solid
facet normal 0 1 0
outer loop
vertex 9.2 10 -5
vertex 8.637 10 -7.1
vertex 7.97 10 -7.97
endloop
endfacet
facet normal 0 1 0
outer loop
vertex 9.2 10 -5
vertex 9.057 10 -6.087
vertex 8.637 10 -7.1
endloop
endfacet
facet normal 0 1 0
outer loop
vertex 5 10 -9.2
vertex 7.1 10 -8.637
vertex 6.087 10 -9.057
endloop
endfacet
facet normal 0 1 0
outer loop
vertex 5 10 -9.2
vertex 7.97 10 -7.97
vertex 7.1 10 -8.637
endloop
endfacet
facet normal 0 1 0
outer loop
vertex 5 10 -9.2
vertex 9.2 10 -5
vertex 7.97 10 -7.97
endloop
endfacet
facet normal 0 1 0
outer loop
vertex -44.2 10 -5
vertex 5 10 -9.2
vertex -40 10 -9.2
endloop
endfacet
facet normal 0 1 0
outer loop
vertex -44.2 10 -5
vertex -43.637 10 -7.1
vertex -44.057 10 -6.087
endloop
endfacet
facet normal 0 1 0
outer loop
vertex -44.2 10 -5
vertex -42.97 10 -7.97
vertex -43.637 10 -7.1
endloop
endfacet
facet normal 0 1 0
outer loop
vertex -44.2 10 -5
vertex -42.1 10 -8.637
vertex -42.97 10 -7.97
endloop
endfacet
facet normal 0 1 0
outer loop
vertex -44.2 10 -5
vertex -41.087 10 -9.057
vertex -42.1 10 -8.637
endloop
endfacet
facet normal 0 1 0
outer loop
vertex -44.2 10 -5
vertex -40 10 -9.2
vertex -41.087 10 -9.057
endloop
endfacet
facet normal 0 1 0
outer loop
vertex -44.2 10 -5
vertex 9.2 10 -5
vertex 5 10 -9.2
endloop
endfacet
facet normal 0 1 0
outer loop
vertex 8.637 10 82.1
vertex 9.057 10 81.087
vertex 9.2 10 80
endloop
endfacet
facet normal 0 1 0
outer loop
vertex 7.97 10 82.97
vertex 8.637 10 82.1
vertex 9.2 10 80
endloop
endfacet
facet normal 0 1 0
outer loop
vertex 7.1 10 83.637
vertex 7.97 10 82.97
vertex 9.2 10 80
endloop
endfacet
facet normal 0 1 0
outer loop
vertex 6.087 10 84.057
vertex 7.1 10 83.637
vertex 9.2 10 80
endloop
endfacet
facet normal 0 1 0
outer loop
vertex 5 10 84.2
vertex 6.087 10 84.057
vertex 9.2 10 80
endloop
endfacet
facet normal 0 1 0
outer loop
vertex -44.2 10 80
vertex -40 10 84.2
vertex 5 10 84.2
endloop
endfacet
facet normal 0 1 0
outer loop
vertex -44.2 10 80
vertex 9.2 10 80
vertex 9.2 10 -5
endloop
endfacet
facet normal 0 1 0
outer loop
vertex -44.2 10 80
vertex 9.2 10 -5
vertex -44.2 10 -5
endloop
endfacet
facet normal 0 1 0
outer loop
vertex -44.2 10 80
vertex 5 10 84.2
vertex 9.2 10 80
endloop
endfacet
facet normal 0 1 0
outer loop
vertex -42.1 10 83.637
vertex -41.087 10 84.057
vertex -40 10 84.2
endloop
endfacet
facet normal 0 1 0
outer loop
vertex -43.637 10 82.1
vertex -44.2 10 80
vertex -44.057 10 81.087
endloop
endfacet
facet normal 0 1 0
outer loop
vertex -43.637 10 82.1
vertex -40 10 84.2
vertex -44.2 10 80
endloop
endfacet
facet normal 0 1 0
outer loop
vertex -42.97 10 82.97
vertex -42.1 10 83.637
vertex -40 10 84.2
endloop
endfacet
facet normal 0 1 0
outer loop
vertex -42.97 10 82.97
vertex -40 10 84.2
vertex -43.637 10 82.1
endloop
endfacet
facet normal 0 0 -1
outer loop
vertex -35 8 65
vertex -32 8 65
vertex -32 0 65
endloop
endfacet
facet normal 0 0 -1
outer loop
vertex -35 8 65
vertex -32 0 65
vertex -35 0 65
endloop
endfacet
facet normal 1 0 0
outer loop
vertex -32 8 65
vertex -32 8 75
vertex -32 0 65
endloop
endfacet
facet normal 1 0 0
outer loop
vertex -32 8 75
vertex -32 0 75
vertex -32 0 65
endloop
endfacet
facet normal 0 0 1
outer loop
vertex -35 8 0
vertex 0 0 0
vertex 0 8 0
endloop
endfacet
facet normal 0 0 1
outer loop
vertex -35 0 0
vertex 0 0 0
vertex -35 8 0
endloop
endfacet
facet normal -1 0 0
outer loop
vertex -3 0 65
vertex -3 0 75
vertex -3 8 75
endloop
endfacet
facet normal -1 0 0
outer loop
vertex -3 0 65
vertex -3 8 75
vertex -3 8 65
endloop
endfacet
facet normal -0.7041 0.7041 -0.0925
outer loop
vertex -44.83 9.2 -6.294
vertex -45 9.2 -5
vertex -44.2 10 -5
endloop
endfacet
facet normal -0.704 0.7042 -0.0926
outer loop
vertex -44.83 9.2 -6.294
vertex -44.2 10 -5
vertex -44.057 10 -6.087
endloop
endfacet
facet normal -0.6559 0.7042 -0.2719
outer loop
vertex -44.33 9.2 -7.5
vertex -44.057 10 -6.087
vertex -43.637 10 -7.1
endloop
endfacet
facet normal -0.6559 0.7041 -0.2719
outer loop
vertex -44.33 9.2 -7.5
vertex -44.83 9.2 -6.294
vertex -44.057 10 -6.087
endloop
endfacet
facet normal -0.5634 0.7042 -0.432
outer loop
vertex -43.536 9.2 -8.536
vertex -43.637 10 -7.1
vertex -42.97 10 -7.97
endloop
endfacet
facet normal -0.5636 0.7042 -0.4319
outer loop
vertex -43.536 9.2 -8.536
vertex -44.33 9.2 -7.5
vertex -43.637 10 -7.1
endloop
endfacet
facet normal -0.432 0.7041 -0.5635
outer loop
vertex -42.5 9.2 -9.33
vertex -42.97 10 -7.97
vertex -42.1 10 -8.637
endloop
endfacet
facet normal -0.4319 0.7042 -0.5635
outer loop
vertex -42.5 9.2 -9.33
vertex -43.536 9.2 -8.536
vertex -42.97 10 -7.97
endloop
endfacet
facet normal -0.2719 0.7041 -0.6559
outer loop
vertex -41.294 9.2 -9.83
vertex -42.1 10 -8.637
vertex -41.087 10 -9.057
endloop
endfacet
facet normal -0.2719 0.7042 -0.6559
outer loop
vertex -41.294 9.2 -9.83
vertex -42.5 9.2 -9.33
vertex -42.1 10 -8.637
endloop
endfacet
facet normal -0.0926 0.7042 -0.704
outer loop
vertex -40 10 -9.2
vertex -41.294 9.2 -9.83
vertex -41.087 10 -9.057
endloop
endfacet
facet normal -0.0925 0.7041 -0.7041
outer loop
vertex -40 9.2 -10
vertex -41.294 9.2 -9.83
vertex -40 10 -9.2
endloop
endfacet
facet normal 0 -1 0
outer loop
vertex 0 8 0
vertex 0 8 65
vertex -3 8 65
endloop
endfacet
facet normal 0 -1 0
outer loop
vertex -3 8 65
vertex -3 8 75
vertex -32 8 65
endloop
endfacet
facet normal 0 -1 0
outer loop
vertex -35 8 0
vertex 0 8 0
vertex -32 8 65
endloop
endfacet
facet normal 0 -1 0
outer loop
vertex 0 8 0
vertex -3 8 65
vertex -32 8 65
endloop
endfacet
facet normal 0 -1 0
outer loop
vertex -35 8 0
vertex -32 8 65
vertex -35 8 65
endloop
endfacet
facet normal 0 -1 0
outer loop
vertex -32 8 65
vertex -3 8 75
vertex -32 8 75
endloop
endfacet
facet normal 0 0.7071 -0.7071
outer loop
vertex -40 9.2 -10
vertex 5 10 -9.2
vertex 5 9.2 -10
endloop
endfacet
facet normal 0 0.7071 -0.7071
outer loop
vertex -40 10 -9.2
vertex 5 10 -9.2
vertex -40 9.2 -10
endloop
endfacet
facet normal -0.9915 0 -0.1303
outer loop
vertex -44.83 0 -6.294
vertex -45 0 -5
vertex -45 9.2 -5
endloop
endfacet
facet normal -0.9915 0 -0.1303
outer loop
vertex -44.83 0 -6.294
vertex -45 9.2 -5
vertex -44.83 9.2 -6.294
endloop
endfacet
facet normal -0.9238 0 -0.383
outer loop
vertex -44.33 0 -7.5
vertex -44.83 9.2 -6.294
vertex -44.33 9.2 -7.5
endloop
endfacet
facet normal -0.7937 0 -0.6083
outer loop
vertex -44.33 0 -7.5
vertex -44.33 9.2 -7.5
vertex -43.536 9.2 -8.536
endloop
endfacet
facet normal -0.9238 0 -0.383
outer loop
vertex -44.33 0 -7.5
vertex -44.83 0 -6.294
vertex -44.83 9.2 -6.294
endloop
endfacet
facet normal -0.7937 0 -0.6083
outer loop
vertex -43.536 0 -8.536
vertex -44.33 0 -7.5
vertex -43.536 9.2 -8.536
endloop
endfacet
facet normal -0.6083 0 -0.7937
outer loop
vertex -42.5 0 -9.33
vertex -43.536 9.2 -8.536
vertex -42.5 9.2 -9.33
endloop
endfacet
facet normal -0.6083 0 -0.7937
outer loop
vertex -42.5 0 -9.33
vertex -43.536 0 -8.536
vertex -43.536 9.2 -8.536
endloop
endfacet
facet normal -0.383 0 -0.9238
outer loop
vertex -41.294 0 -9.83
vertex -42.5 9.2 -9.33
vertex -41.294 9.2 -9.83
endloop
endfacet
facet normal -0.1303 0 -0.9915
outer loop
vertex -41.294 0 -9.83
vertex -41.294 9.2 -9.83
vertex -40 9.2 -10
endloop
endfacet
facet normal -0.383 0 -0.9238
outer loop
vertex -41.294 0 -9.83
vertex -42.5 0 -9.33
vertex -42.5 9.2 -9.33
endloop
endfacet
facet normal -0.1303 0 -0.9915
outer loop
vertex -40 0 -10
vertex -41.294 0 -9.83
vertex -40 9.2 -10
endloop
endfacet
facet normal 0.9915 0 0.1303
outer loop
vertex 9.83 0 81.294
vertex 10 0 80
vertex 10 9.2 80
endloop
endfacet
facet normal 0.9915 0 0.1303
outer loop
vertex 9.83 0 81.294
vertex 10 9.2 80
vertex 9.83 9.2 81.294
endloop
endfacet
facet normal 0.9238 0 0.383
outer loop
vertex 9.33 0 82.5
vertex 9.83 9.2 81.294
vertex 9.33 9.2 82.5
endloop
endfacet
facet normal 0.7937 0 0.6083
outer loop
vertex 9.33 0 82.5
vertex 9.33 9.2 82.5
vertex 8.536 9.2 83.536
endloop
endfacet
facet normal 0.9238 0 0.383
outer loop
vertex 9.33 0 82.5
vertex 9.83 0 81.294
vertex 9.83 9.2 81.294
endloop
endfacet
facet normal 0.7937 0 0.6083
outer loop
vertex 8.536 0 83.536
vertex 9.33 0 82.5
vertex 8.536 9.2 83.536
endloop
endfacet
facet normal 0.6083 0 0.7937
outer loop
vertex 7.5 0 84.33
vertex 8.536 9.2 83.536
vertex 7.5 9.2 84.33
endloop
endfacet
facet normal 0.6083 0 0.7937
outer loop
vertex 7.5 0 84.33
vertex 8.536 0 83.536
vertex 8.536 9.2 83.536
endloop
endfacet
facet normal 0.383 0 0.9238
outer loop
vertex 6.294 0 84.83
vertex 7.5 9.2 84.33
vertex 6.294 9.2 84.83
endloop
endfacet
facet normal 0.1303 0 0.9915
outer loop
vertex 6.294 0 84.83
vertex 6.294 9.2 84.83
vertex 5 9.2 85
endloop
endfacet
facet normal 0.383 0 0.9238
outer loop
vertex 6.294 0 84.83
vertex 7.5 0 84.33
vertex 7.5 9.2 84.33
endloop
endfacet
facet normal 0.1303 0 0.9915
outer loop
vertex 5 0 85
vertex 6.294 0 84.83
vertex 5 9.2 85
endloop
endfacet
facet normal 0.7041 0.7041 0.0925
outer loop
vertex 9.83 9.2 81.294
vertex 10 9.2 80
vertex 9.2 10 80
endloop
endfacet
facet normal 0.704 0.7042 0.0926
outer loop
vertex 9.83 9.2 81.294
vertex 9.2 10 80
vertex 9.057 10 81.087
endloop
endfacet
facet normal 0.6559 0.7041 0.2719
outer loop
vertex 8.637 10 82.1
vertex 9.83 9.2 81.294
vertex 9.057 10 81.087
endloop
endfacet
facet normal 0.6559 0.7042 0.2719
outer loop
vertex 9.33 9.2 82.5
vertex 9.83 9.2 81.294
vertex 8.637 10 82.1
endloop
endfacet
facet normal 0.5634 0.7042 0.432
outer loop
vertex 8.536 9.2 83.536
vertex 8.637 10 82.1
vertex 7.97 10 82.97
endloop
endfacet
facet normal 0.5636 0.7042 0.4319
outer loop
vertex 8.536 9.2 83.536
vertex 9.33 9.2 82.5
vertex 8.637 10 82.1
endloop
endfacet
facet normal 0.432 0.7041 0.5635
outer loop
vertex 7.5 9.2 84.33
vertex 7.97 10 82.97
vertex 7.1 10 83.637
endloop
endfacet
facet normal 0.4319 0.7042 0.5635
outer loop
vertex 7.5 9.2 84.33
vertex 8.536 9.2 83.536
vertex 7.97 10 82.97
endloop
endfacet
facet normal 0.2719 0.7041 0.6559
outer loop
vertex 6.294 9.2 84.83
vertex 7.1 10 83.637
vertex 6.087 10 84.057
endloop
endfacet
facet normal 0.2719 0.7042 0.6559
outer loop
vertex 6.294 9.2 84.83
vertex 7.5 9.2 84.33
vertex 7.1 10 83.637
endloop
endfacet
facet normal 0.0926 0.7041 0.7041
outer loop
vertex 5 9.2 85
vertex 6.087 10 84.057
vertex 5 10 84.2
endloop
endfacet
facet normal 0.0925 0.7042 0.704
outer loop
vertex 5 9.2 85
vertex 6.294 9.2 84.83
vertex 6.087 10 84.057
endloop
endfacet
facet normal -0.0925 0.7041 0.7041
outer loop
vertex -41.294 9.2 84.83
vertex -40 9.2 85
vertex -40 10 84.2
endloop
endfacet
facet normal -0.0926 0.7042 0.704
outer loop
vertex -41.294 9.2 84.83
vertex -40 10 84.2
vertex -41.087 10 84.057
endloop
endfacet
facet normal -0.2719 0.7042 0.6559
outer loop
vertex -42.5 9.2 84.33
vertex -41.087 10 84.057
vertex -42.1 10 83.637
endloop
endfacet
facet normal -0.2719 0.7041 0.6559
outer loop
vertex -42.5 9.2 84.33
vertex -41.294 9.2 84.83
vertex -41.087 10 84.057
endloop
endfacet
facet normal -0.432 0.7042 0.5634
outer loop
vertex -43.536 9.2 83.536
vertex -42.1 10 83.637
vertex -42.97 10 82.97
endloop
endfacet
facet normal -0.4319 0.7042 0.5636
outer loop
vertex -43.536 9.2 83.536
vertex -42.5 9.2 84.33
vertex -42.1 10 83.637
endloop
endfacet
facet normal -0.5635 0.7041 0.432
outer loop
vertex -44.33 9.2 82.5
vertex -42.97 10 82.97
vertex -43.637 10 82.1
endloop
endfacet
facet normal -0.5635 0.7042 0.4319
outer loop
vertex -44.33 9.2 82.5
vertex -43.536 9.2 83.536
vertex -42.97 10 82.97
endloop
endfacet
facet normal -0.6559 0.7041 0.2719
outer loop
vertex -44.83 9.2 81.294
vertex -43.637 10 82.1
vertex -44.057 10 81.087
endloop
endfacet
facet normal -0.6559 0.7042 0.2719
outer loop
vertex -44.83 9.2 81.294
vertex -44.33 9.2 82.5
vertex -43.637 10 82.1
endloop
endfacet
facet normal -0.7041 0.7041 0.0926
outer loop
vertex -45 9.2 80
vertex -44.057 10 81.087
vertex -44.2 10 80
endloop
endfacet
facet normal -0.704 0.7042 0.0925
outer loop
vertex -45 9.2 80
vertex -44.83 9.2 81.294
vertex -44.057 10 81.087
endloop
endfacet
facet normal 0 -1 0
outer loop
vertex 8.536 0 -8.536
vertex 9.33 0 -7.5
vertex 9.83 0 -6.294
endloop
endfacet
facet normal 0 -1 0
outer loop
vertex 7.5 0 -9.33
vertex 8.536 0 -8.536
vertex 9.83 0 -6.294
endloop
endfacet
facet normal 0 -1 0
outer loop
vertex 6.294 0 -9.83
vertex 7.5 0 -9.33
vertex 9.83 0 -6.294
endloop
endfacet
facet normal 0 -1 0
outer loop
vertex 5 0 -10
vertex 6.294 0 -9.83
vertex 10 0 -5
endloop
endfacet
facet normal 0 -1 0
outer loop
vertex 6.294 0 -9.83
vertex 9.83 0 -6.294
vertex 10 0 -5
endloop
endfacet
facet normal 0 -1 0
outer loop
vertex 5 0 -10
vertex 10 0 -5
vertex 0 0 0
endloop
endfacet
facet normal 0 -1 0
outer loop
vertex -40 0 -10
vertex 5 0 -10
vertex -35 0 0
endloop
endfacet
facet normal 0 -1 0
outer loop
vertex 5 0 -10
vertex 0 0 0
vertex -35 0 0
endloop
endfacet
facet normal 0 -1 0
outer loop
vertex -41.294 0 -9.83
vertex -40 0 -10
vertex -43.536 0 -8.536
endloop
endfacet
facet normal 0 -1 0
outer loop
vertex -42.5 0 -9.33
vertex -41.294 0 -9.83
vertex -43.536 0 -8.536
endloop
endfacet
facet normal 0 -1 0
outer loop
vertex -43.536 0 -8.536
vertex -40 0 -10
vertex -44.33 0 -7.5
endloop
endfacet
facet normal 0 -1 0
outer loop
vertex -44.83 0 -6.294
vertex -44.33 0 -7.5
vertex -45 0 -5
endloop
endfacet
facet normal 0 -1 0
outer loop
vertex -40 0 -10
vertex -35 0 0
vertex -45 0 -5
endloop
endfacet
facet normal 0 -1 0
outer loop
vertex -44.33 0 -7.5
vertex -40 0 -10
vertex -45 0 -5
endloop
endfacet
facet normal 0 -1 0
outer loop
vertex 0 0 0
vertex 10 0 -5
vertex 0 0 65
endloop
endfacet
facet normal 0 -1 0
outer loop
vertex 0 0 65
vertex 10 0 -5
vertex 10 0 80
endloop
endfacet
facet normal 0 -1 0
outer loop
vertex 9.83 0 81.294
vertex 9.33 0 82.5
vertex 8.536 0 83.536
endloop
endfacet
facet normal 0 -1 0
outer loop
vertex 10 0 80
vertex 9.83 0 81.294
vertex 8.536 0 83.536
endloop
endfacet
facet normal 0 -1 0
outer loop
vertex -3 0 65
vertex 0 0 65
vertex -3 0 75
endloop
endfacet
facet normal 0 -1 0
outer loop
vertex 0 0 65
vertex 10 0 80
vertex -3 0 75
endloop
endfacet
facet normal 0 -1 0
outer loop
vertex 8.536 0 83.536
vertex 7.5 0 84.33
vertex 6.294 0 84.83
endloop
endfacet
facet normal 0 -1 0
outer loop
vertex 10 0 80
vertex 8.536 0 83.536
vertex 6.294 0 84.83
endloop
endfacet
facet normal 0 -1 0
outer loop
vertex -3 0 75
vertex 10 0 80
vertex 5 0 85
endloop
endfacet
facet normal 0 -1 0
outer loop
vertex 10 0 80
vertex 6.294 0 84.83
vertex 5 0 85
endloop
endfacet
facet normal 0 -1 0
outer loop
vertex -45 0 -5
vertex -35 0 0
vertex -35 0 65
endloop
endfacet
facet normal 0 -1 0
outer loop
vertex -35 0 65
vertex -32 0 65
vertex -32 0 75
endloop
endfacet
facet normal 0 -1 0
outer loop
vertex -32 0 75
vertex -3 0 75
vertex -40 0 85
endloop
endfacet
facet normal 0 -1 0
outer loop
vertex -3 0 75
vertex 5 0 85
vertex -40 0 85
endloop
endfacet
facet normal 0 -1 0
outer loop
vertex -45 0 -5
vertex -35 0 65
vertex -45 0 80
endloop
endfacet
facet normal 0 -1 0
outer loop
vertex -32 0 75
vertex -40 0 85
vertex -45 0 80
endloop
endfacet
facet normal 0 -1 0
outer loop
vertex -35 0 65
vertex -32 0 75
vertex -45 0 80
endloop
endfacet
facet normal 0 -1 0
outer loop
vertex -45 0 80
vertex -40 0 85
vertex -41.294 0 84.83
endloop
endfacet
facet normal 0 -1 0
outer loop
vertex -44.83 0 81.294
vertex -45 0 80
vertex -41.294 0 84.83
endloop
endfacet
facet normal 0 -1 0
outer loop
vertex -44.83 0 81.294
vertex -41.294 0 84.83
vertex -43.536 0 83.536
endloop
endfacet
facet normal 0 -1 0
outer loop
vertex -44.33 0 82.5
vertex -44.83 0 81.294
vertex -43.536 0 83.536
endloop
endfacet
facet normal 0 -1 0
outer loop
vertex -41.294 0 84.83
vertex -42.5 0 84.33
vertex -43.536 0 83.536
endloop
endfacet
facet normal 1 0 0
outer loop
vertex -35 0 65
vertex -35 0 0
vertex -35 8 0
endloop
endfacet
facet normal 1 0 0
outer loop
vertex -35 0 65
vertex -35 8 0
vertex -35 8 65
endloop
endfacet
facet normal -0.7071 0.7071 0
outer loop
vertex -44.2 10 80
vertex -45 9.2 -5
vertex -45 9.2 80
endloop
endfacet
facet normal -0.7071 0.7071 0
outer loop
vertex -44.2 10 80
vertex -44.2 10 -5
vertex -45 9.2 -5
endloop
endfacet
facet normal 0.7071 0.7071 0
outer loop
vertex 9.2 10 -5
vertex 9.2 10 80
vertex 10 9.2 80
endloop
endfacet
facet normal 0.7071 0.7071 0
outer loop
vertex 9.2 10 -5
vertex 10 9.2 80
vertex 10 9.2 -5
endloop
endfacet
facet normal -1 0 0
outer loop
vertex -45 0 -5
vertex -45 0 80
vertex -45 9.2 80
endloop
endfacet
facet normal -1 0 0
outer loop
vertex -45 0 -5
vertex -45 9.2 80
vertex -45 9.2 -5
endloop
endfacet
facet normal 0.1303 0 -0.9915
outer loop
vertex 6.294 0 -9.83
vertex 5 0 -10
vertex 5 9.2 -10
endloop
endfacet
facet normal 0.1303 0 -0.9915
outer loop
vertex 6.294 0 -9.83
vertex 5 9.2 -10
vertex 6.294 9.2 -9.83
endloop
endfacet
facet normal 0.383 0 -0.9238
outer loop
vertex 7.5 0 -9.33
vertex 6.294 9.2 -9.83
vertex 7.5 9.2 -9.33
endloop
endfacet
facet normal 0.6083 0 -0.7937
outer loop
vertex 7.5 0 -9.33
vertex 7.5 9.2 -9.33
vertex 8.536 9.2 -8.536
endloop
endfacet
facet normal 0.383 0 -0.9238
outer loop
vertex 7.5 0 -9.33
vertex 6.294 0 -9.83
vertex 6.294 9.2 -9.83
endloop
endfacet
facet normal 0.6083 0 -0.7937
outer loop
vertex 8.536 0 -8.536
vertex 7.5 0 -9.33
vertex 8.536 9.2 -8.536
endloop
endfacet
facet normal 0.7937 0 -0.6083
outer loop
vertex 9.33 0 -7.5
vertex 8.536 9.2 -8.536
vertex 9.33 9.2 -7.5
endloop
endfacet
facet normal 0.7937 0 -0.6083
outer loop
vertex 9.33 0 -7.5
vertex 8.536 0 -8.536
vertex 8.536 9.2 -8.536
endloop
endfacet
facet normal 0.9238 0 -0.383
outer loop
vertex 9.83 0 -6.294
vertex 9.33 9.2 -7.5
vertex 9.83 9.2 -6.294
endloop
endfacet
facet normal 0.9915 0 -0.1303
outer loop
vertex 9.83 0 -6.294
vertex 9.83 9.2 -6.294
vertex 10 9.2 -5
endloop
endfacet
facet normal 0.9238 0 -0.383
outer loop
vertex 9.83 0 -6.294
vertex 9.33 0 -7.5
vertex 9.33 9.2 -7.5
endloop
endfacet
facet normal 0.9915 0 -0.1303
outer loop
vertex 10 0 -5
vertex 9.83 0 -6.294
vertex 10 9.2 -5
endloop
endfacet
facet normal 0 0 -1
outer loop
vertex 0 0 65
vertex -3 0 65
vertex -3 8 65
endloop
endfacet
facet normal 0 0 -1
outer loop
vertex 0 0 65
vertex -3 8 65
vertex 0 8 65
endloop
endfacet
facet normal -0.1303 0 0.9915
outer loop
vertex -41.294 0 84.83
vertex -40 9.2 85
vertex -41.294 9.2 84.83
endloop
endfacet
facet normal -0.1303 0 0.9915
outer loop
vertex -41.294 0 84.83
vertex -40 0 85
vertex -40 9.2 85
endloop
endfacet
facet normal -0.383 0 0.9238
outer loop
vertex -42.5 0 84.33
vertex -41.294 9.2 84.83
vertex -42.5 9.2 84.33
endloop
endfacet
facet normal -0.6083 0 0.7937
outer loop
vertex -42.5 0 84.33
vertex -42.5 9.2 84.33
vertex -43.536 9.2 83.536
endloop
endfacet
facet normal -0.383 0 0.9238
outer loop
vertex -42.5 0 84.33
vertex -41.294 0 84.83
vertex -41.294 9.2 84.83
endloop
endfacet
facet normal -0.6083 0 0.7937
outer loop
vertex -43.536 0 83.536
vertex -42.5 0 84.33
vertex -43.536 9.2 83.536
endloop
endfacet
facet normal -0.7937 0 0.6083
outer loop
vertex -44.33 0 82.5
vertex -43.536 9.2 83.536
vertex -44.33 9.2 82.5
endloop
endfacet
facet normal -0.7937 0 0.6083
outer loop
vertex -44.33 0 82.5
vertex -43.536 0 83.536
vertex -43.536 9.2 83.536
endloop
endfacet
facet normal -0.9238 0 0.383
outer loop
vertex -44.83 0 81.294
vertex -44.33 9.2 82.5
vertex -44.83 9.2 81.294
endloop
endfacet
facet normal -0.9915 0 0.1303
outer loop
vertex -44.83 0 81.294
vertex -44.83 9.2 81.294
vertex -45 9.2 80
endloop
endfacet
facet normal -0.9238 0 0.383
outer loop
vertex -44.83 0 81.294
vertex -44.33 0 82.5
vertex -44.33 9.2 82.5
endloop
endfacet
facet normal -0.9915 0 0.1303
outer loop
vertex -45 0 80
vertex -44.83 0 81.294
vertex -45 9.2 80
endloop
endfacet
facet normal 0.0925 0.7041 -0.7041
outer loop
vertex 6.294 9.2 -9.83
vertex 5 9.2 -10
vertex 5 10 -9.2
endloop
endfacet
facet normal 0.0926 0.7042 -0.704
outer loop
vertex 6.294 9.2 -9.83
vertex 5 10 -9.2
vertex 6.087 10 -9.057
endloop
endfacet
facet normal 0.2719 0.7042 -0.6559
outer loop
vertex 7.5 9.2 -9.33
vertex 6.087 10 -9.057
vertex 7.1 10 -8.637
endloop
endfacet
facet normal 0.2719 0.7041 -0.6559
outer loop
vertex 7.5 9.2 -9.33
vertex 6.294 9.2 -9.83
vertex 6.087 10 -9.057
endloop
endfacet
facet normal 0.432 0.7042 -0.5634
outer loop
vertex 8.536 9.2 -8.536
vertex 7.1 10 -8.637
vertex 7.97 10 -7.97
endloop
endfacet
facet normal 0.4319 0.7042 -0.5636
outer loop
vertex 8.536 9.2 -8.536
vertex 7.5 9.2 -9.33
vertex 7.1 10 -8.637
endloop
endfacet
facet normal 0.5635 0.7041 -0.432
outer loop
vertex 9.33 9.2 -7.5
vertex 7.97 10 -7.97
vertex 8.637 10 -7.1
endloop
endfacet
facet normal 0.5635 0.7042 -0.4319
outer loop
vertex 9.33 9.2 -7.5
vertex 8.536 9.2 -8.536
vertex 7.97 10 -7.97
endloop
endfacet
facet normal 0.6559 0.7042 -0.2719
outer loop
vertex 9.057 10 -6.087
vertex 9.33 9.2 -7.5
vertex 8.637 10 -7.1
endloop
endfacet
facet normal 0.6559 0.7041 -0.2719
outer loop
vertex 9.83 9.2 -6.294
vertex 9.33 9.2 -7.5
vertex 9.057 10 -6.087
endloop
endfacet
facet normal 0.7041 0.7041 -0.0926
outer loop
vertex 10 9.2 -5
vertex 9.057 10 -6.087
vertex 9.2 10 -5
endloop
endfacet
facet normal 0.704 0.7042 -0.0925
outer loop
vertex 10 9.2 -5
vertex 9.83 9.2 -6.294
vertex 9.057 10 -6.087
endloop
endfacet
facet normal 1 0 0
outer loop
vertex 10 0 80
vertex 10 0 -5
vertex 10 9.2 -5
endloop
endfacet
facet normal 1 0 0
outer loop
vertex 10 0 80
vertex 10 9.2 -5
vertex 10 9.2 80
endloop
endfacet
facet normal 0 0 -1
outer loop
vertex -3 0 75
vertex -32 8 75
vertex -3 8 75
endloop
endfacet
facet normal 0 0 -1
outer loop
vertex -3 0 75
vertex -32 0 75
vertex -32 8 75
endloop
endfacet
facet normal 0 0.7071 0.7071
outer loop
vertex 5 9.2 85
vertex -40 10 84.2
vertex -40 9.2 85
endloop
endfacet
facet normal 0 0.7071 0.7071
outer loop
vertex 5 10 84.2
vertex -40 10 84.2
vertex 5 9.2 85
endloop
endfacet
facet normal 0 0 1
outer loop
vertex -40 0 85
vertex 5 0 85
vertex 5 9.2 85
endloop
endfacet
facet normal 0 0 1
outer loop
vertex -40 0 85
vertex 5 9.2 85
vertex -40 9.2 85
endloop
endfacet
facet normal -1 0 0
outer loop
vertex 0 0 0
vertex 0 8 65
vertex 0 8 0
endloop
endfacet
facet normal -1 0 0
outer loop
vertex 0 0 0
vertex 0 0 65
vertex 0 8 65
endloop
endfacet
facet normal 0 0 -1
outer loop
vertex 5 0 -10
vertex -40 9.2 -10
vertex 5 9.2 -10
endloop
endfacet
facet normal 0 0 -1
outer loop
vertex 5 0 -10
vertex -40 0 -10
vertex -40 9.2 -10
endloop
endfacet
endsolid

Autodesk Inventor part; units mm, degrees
ref_plane "YZ Plane" through (0, 0, 0) normal (1, 0, 0) x (0, 1, 0)
ref_plane "XZ Plane" through (0, 0, 0) normal (0, 1, 0) x (-1, 0, 0)
ref_plane "XY Plane" through (0, 0, 0) normal (0, 0, 1) x (1, 0, 0)
sketch "Sketch1" plane through (0, 0, 0) normal (0, 1, 0) x (-1, 0, 0)
  line L0 (0, 0) -> (35, 0)
  line L1 (35, 0) -> (35, 75)
  line L2 (35, 75) -> (0, 75)
  line L3 (0, 75) -> (0, 0)
  line L4 (45, -10) -> (-10, -10)
  line L5 (-10, -10) -> (-10, 85)
  line L6 (-10, 85) -> (45, 85)
  line L7 (45, 85) -> (45, -10)
  line L8 (35, 0) -> (45, -10) construction
  arc A0 (40, -10) -> (45, -5) centre (40, -5) ccw
  line L9 (45, 37.5) -> (48.3975, 37.5) construction
  line L10 (17.5, 85) -> (17.5, 95.7522) construction
  arc A1 (45, 80) -> (40, 85) centre (40, 80) ccw
  arc A2 (-10, -5) -> (-5, -10) centre (-5, -5) ccw
  arc A3 (-5, 85) -> (-10, 80) centre (-5, 80) ccw
  line L11 (32, 75) -> (32, 65)
  line L12 (32, 65) -> (35, 65)
  line L13 (3, 75) -> (3, 65)
  line L14 (3, 65) -> (0, 65)
  dimension "d0" = 35
  dimension "d1" = 75
  dimension "d2" = 10
  dimension "d8" = 10
  dimension "d9" = 3
extrude "Extrusion1" add sketch "Sketch1" along normal blind 10 contours L3 L14 L13 L2 L11 L12 L1 L0 | L3 L2 L13 L14 | L12 L11 L2 L1 | L4 A2 L5 A3 L6 A1 L7 A0
extrude "Extrusion2" cut sketch "Sketch1" along normal blind 8 contours L3 L14 L13 L2 L11 L12 L1 L0
sketch "Sketch3" plane through (5, 0, -10) normal (0, 0, -1) x (-1, 0, 0)
  line L0 (45, 10) -> (0, 10) projected
  line L1 (22.5, 10) -> (22.5, 15.0736) construction
  line L2 (27.5, 8) -> (17.5, 8)
  line L3 (0, 10) -> (45, 10) projected
  line L4 (14.5, 5) -> (14.5, -4.5377)
  line L5 (30.5, -4.5377) -> (30.5, 5)
  line L6 (37, 0) -> (8, 0) projected
  line L7 (30.5, 0) -> (14.5, 0)
  arc A0 (30.5, 5) -> (27.5, 8) centre (27.5, 5) ccw
  arc A1 (17.5, 8) -> (14.5, 5) centre (17.5, 5) ccw
  line L8 (8, 8) -> (37, 8) projected
  point P0 (5, 0)
  point P1 (30.5, 8)
  point P2 (14.5, 8)
  dimension "d15" = 8
  dimension "d16" = 8
  dimension "d19" = 3
extrude "Extrusion3" [suppressed]
chamfer "Chamfer1" [suppressed]
chamfer "Chamfer2" distance 0.8 angle 45 8 edges at (-17.5, 10, -10) (-43.5355, 10, -8.5355) (-45, 10, 37.5) (-43.5355, 10, 83.5355) (-17.5, 10, 85) (8.5355, 10, 83.5355) (10, 10, 37.5) (8.5355, 10, -8.5355)
equation "\"d16\" = d15"
properties part number "scatola_sopra"
